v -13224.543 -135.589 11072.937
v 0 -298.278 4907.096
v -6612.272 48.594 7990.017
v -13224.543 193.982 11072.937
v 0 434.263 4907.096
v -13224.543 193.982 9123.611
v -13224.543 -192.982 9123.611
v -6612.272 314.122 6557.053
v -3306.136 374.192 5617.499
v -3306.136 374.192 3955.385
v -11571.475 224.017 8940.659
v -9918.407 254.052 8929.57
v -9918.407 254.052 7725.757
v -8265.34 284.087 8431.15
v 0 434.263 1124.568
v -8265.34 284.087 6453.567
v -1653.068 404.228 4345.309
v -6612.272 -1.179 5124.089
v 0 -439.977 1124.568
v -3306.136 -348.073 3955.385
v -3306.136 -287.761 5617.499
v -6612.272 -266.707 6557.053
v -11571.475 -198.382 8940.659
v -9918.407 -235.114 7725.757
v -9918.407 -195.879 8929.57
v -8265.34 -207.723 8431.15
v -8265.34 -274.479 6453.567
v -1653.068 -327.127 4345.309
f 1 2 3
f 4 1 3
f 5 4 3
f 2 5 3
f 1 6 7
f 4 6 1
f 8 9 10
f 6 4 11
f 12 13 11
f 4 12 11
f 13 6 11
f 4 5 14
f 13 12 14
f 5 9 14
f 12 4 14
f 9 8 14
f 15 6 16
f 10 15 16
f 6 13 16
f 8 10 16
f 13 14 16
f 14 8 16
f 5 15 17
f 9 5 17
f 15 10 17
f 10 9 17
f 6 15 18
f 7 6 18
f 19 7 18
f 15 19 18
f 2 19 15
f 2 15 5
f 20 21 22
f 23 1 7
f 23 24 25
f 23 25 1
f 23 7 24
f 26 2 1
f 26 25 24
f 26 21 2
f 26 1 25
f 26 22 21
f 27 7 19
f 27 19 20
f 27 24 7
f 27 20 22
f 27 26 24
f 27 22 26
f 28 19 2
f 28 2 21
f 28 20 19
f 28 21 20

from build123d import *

# Parameters (mm, degrees)
SKETCH4_W          = 14986.678438392
SKETCH4_H          = 7706.357590778
CUT_EXTRUDE1_DEPTH = 5181.6


with BuildPart() as part:
    # Surface-Knit3: read off the stored shape, not the designer's step
    # Surface-Knit3: loft between two sections, ruled curve by curve
    surface_knit3_from = [
        Edge.make_bspline([(-17711.940475464, -80.385008706, 13165.151542886), (-17711.940475464, -85.182687055, 12943.938602187), (-17711.940475464, -89.980365404, 12722.725661487), (-17711.940475464, -99.575722103, 12280.299780089), (-17711.940475464, -104.373400452, 12059.086839389), (-17711.940475464, -109.171078801, 11837.87389869)], [0, 0, 0, 0, 0.5, 0.5, 1, 1, 1, 1], 3),
        Edge.make_line((-17711.940475464, -80.385008706, 13165.151542886), (-17711.940475464, 112.448931944, 13165.151542886)),
        Edge.make_line((-17711.940475464, 112.448931944, 11837.87389869), (-17711.940475464, -109.171078801, 11837.87389869)),
        Edge.make_line((-17711.940475464, 112.448931944, 13165.151542886), (-17711.940475464, 112.448931944, 11837.87389869)),
    ]
    surface_knit3_to = [
        Edge.make_bspline([(0, -298.277774529, 4907.09615841), (0, -321.894328297, 4276.674740223), (0, -345.510882066, 3646.253322036), (0, -392.743989603, 2385.410485661), (0, -416.360543372, 1754.989067474), (0, -439.977097141, 1124.567649286)], [0, 0, 0, 0, 0.5, 0.5, 1, 1, 1, 1], 3),
        Edge.make_line((0, -298.277774529, 4907.09615841), (0, 434.262669848, 4907.09615841)),
        Edge.make_line((0, 434.262669848, 1124.567649286), (0, -439.977097141, 1124.567649286)),
        Edge.make_line((0, 434.262669848, 4907.09615841), (0, 434.262669848, 1124.567649286)),
    ]
    surface_knit3 = Solid(Shell([*[Face.make_surface_from_curves(surface_knit3_from[k], surface_knit3_to[k]) for k in range(4)], Face(Wire(surface_knit3_from)), Face(Wire(surface_knit3_to))]))
    add(surface_knit3)

    # Sketch4 → Cut-Extrude1 (cut, along a direction that is not the sketch's normal)
    with BuildSketch(Plane.ZY.offset(17711.940475464)):
        with Locations((12517.353947819, -161.456903525)):
            Rectangle(SKETCH4_W, SKETCH4_H)
    extrude(amount=-CUT_EXTRUDE1_DEPTH, dir=(-0.8660254037844378, 0, 0.5000000000000014), mode=Mode.SUBTRACT)


solid = part.part
